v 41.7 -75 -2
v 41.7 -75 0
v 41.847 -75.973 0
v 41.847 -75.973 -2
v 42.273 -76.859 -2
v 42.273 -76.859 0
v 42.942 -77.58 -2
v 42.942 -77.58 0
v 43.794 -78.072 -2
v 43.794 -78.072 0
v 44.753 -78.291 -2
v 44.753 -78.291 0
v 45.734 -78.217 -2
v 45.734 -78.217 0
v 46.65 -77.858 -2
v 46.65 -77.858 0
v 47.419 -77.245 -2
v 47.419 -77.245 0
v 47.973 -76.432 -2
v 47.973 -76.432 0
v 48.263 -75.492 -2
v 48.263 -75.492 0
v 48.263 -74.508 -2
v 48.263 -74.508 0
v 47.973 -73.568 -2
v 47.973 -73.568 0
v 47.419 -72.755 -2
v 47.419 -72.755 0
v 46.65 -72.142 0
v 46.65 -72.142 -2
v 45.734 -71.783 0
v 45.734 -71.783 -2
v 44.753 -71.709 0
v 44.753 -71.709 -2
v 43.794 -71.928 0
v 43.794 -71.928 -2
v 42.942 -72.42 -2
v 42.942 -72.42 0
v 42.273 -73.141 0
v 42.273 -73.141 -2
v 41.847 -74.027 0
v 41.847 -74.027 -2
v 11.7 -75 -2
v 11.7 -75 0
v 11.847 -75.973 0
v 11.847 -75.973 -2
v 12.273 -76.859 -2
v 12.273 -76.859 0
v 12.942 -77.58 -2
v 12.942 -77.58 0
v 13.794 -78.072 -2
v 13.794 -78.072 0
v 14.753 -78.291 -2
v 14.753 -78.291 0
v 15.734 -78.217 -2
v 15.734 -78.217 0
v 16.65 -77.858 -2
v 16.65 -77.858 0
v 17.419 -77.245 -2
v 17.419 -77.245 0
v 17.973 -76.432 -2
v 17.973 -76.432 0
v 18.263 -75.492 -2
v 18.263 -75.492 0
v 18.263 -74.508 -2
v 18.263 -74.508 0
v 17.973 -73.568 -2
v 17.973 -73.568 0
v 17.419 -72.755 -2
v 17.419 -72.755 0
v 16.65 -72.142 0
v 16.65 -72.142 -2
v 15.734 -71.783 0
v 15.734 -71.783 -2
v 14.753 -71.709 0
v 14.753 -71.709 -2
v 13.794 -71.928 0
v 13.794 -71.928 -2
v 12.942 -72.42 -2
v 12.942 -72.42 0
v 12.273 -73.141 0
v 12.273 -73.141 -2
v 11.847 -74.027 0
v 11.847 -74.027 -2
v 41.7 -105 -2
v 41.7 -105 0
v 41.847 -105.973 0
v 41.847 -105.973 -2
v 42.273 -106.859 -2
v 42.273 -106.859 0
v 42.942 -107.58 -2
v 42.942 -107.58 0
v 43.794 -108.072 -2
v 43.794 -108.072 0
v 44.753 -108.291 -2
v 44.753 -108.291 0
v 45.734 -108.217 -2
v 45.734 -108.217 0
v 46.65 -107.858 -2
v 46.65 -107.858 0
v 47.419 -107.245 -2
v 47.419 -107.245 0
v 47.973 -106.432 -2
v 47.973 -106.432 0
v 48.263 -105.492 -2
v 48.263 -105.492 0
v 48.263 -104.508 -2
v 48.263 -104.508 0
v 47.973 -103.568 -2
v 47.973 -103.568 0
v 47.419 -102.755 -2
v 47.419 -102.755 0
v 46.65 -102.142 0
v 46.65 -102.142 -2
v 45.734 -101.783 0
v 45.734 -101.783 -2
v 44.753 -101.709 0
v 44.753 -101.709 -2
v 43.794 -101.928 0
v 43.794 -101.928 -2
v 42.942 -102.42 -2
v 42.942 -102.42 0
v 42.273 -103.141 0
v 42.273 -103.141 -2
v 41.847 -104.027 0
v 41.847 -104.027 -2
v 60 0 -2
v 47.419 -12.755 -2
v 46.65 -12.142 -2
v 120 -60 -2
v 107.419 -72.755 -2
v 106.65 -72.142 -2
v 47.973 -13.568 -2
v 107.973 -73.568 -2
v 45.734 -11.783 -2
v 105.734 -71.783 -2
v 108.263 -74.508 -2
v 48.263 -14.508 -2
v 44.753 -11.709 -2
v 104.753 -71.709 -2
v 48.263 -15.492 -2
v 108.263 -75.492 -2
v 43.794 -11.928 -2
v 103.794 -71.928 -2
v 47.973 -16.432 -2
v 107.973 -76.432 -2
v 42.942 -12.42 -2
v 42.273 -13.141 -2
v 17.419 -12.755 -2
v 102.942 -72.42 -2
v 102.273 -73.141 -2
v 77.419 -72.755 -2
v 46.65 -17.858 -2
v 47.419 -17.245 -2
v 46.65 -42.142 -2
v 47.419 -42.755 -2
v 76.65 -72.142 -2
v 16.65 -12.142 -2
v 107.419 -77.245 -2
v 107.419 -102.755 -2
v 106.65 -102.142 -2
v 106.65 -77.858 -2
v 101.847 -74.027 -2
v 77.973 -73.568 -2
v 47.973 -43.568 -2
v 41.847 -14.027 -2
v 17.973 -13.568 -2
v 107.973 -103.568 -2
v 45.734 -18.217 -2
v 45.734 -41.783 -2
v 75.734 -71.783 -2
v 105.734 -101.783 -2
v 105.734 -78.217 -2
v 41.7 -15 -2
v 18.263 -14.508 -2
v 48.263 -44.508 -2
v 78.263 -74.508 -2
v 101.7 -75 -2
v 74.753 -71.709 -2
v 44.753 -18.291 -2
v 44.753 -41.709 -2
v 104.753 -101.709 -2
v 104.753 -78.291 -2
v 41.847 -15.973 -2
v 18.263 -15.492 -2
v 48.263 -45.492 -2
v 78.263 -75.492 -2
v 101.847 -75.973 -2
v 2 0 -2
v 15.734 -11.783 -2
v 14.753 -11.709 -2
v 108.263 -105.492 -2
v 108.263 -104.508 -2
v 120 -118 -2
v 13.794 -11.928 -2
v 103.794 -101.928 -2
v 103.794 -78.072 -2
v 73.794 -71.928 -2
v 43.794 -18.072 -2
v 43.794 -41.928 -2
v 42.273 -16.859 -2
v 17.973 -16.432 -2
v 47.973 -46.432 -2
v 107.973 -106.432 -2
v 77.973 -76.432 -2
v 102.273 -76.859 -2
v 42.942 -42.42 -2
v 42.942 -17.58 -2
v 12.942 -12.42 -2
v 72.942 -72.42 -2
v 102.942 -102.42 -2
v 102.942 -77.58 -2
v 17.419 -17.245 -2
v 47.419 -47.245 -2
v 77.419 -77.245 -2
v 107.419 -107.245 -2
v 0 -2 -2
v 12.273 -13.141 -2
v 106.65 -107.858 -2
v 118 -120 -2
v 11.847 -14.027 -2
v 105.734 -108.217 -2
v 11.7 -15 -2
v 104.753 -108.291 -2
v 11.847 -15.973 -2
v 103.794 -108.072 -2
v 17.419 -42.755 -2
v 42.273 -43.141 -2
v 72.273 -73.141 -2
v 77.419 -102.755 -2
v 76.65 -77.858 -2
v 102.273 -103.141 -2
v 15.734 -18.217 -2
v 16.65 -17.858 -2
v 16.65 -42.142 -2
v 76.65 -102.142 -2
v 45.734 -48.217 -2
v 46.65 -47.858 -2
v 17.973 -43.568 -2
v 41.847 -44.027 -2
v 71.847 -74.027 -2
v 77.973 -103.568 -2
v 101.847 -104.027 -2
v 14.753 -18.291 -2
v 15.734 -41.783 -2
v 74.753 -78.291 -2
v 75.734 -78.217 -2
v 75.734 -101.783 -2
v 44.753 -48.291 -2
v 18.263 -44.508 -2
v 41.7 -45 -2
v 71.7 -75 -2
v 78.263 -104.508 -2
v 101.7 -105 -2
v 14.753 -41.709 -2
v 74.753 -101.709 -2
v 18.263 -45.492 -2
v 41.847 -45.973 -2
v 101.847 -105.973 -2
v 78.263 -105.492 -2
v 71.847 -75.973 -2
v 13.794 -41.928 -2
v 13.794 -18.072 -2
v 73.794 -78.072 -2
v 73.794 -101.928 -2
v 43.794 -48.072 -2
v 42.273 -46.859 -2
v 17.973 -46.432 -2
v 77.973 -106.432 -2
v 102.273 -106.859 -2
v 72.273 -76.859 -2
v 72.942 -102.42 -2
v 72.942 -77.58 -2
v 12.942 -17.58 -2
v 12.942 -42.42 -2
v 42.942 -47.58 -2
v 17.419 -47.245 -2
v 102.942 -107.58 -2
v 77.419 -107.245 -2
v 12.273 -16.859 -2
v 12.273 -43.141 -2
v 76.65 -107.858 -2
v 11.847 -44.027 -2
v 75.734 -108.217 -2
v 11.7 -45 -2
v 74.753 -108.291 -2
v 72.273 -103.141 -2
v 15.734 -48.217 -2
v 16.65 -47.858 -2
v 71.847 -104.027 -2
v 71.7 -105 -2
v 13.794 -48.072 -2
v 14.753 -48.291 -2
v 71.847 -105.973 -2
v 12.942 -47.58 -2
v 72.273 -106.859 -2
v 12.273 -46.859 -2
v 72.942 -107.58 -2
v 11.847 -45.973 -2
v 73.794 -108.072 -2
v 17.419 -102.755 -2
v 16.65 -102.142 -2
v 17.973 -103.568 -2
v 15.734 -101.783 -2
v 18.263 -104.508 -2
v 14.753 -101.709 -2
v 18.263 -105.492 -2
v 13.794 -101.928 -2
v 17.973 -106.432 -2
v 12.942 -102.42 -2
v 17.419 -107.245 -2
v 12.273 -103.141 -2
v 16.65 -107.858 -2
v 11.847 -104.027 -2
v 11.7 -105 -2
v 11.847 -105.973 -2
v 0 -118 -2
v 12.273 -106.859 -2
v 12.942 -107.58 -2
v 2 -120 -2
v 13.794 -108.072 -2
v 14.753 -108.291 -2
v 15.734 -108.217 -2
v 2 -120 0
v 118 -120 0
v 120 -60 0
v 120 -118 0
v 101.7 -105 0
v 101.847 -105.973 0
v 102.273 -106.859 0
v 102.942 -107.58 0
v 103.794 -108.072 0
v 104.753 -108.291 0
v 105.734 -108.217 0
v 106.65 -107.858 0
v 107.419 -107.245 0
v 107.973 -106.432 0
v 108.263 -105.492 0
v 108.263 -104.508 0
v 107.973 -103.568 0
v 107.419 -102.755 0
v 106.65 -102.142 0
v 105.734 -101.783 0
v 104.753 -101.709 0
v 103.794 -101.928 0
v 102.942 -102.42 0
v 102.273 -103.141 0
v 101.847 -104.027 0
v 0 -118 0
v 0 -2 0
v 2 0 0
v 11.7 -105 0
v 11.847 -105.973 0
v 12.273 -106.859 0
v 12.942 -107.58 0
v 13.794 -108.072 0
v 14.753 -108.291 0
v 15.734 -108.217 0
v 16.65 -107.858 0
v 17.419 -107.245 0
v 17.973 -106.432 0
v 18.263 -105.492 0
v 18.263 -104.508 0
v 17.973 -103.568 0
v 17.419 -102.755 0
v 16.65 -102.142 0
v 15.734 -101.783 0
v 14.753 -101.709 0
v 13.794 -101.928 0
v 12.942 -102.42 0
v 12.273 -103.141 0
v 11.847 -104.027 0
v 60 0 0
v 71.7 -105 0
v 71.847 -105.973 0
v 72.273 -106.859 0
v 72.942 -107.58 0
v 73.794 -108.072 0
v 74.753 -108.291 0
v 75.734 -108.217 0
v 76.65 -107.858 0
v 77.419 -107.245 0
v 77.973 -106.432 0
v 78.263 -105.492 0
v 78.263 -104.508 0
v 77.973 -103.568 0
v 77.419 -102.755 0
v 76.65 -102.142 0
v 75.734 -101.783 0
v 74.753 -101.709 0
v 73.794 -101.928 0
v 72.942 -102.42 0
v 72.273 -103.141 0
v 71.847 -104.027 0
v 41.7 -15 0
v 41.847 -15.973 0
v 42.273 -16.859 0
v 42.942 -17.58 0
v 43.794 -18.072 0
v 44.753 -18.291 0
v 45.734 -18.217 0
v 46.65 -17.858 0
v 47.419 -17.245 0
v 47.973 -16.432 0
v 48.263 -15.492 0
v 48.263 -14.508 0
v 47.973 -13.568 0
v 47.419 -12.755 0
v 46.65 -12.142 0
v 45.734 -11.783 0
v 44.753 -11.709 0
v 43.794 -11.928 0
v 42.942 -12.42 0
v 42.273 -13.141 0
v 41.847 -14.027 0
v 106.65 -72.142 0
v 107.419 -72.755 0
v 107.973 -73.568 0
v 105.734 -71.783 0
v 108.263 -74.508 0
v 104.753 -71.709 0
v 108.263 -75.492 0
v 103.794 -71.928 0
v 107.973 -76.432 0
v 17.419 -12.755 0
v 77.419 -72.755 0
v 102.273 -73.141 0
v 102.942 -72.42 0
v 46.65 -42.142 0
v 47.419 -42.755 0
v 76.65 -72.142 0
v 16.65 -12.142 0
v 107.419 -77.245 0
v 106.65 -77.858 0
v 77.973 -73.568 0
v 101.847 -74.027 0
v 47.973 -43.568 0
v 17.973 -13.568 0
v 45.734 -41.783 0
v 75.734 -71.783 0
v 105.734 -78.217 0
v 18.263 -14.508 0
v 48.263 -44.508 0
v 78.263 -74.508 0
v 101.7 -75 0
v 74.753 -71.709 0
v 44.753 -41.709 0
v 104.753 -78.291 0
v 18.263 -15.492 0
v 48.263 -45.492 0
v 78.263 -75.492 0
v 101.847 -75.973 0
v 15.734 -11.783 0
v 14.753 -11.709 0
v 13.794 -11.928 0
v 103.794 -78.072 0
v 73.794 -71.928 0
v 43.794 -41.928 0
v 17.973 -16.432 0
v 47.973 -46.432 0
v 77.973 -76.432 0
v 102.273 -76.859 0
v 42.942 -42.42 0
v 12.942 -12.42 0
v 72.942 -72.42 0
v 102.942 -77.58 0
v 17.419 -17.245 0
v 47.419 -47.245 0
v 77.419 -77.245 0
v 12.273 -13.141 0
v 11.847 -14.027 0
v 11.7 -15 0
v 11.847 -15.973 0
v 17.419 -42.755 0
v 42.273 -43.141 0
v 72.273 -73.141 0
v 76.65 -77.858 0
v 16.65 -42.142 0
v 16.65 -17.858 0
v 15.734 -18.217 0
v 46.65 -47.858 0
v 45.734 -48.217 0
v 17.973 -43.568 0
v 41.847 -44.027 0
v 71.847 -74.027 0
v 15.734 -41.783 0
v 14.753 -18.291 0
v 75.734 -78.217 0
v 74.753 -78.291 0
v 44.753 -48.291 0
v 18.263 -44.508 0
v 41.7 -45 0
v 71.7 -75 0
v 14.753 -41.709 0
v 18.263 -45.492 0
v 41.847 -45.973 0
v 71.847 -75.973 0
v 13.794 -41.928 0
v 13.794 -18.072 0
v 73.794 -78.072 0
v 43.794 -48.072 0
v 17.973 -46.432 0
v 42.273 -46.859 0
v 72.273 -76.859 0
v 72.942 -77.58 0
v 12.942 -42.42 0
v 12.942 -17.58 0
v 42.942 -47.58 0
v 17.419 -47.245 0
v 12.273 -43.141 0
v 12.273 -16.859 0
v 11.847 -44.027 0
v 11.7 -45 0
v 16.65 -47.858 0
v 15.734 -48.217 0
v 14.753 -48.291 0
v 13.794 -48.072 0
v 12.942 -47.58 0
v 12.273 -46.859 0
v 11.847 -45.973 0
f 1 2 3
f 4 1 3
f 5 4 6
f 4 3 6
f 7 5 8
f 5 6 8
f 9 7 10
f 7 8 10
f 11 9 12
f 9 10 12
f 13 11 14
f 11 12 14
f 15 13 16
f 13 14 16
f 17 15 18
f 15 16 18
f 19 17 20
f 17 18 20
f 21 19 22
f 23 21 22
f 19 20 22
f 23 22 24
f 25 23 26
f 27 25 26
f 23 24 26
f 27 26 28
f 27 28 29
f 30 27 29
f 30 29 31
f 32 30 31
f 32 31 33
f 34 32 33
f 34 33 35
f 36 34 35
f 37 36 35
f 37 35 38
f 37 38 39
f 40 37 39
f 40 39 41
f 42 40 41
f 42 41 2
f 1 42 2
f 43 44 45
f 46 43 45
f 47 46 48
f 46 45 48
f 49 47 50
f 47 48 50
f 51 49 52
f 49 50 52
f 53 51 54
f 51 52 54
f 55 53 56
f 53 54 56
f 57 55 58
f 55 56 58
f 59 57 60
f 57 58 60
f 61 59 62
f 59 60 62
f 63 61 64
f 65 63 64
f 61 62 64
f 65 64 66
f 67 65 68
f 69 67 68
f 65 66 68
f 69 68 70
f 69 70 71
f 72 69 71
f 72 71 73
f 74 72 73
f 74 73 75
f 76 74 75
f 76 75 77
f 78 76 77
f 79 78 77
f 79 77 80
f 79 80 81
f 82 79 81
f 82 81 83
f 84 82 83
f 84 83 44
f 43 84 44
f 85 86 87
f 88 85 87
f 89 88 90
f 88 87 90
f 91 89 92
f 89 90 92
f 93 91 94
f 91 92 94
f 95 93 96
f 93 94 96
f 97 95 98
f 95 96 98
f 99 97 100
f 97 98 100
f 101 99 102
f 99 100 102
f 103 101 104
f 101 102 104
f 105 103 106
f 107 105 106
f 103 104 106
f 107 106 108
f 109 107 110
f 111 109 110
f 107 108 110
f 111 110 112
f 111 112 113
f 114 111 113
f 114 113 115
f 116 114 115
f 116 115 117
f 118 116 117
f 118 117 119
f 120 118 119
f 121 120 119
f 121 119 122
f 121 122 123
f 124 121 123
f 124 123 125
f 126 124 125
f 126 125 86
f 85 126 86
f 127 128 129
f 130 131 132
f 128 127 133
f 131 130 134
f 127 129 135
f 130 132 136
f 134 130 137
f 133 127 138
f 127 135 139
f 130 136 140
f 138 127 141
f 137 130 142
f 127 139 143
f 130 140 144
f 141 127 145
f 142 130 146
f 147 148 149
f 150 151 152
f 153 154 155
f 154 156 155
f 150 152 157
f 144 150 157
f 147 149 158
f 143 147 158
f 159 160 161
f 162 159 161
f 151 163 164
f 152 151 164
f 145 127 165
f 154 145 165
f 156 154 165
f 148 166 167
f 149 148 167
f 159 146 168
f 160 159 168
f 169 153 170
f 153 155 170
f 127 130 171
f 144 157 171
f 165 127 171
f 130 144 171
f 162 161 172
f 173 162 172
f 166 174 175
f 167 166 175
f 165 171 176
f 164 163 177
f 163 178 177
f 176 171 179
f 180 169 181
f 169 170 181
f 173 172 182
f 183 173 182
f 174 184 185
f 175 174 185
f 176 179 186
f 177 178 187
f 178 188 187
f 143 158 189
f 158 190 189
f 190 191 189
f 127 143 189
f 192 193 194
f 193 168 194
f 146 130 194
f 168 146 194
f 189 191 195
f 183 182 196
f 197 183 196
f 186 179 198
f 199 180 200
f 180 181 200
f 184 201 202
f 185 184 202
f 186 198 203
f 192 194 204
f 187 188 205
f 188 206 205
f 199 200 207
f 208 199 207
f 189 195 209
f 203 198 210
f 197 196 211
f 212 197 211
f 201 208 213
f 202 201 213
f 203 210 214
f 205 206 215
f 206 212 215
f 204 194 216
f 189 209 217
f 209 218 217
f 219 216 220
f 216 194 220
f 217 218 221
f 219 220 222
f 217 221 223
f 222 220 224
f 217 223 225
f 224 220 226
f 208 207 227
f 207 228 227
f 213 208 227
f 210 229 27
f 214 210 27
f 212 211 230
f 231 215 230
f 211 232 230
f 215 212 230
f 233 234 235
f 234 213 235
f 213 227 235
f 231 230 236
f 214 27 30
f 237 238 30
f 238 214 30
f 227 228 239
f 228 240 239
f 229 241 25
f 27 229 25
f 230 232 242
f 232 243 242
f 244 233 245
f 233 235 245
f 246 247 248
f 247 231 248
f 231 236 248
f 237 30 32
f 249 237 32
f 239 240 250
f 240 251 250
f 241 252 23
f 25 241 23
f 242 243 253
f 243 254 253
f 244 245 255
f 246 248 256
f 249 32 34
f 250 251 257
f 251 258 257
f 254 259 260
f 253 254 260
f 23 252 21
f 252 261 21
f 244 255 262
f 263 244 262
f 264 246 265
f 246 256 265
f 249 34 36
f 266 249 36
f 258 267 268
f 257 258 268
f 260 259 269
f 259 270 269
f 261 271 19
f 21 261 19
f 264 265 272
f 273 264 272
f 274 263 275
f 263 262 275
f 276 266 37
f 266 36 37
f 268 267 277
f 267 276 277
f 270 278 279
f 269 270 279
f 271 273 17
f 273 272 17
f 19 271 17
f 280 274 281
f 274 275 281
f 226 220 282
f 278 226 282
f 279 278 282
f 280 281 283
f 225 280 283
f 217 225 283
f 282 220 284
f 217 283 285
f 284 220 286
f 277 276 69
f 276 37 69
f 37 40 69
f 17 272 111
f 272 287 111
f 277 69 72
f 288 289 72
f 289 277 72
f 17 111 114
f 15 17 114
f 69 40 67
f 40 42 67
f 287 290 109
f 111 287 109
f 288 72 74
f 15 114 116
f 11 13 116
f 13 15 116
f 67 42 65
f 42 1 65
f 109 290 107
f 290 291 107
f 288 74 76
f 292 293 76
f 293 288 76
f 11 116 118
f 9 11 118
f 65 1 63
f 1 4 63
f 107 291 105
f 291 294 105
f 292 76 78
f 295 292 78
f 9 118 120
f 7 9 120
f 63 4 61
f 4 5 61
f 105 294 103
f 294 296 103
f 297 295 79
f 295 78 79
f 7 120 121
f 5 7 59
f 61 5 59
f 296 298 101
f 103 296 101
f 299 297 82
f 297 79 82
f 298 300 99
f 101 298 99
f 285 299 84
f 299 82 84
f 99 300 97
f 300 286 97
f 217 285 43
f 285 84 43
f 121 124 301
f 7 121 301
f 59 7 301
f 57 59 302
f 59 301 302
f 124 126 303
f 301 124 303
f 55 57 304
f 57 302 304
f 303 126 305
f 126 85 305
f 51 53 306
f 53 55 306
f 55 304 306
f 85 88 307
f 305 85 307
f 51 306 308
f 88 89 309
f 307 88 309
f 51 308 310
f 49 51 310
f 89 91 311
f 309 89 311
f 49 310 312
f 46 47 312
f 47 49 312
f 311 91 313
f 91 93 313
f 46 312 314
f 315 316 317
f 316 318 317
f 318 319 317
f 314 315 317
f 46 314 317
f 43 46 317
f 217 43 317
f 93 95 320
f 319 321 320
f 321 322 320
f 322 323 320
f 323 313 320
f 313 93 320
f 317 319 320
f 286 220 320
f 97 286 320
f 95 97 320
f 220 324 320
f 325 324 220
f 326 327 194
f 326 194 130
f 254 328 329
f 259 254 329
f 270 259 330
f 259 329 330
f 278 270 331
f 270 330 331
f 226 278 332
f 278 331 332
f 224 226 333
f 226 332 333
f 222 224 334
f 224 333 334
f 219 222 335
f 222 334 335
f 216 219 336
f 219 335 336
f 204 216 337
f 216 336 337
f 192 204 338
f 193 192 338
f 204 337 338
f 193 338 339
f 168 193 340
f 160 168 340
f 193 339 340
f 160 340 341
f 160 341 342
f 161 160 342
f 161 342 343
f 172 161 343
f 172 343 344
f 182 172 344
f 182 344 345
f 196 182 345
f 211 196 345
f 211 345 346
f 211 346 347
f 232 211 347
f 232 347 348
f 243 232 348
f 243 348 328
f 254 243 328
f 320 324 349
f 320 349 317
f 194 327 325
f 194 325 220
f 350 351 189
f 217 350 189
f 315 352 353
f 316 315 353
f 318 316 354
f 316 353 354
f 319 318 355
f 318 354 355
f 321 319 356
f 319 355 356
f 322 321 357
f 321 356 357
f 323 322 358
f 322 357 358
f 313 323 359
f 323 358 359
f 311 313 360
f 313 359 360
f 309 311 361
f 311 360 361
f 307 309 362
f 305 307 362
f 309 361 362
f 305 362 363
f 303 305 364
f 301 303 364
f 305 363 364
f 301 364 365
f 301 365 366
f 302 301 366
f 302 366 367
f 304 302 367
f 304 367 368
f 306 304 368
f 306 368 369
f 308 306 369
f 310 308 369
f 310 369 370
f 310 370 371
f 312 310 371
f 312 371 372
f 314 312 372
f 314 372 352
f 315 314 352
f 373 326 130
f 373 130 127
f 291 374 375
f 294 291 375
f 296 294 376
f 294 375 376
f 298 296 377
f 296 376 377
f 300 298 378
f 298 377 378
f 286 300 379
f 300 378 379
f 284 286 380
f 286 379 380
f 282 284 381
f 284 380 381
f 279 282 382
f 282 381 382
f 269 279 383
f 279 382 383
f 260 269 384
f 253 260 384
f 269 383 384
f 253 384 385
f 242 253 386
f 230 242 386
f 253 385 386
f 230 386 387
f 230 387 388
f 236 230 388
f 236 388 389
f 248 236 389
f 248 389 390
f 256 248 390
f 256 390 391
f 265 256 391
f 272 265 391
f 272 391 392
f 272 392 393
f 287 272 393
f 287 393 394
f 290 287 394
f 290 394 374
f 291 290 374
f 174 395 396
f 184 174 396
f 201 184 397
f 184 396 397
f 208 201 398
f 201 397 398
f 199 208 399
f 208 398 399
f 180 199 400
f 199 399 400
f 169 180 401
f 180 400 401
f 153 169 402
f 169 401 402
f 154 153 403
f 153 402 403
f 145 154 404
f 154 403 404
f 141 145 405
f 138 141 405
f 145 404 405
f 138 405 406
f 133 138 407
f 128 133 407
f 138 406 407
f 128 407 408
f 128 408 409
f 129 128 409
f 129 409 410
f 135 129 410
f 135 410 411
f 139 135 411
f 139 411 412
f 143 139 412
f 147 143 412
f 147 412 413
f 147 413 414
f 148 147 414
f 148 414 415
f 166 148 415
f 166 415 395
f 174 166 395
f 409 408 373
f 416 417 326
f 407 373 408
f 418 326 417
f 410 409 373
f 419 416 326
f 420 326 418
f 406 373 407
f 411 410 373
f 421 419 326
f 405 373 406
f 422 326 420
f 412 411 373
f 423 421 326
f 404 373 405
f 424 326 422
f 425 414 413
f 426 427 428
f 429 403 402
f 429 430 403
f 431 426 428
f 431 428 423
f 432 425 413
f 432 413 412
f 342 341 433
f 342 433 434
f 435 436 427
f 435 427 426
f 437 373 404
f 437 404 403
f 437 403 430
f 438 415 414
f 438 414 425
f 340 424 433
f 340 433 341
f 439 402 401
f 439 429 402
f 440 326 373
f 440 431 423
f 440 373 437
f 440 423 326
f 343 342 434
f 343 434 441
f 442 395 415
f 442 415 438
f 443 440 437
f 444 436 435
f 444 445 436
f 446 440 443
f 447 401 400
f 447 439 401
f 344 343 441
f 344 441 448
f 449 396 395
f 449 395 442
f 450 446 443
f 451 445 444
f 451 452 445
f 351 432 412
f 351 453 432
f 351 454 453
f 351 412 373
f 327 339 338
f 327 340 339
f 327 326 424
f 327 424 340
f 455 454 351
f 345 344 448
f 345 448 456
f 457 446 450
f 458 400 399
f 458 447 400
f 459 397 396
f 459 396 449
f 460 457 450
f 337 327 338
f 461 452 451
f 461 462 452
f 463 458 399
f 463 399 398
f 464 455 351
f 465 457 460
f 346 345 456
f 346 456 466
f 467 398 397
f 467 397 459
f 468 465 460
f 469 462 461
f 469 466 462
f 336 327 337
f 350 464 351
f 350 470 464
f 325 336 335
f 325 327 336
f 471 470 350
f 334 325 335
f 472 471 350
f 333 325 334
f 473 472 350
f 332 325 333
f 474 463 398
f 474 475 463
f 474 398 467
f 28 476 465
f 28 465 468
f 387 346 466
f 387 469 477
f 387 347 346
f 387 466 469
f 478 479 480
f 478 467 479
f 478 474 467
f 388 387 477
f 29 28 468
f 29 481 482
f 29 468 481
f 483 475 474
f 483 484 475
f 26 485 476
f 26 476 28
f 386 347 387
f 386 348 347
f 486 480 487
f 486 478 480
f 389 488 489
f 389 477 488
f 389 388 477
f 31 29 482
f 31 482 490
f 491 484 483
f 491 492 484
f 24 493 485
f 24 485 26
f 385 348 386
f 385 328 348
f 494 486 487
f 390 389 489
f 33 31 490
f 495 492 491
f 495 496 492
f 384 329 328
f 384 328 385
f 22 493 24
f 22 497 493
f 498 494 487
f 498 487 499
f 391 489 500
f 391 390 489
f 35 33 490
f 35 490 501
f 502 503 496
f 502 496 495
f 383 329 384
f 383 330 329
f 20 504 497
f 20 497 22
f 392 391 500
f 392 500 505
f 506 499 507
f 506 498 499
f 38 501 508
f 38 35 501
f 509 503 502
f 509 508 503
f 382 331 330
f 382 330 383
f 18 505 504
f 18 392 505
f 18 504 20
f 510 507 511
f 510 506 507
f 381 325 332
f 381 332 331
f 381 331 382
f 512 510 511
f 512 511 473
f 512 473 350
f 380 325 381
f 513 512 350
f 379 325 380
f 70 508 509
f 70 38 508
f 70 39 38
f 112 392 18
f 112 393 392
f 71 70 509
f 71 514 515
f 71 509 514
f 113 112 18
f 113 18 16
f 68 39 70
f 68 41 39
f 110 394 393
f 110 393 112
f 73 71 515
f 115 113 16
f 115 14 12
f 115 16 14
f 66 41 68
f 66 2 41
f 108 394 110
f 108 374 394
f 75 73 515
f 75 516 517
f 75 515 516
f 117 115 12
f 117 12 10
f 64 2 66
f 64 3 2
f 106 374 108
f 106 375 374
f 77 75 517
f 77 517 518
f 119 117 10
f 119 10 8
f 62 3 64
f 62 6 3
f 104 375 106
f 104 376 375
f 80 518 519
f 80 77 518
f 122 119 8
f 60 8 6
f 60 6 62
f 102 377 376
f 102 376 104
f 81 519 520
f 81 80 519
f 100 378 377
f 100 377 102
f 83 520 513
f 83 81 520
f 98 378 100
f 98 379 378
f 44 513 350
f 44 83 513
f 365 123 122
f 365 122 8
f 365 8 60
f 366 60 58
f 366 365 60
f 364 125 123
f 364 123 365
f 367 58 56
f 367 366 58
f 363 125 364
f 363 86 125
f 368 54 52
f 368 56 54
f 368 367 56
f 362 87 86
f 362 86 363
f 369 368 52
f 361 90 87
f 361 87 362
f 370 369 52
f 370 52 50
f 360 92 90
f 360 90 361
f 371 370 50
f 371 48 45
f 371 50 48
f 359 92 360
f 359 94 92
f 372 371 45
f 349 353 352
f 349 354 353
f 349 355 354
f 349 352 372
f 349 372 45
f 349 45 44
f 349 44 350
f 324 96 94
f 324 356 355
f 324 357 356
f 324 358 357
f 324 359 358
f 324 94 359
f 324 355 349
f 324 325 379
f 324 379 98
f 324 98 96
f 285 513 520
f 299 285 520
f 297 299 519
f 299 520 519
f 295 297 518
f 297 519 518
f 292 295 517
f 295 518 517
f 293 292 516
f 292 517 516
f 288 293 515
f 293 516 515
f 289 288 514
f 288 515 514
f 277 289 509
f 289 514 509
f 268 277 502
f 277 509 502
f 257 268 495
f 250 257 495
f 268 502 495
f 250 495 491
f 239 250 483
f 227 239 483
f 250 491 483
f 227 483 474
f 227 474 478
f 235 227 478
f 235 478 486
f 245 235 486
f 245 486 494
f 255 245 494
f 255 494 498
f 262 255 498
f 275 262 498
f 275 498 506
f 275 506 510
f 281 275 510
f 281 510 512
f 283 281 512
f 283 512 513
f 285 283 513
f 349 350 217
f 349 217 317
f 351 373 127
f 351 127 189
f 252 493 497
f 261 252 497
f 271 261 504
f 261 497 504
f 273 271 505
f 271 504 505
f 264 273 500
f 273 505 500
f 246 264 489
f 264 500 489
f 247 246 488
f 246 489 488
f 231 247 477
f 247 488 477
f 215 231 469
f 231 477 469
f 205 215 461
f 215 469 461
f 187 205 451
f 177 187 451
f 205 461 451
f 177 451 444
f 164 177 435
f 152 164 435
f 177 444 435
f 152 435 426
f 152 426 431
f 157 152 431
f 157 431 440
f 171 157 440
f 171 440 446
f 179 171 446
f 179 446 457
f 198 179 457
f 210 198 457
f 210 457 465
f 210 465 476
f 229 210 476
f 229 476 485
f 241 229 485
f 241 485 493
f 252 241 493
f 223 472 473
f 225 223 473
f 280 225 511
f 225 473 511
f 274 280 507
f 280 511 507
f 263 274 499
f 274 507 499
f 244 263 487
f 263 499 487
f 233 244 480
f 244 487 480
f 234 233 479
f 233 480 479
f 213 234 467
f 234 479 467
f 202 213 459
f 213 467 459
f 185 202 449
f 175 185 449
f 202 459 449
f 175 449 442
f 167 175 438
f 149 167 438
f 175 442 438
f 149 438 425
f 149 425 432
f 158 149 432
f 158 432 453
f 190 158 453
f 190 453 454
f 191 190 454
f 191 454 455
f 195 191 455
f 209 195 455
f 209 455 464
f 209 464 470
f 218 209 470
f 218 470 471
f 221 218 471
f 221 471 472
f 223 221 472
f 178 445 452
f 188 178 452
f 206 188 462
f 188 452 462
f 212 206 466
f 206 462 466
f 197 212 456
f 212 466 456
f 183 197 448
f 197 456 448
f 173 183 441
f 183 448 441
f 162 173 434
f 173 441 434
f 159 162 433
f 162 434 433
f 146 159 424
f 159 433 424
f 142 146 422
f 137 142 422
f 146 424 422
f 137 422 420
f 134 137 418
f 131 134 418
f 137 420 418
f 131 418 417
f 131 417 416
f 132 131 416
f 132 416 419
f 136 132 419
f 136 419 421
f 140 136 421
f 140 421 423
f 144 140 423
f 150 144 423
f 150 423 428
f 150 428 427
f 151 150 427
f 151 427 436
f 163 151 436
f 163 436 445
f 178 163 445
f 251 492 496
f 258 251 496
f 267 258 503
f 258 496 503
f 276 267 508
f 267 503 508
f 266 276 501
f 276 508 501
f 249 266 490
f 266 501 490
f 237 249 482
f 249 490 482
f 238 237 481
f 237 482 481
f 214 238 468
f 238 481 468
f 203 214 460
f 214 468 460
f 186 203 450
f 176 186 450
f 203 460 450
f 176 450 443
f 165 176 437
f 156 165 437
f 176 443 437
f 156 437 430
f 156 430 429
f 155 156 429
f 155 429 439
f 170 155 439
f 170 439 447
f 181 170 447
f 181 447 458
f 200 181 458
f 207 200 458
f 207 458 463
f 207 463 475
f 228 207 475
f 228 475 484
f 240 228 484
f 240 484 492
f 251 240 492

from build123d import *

# Parameters (mm, degrees)
EXTRUDE_1_DEPTH   = 2
HOLE_WIZARD_M61_D = 6.6
CHAMFER_1_SIZE    = 2


with BuildPart() as part:
    # Эскиз1 → Бобышка-Вытянуть1 (new body)
    with BuildSketch(Plane(origin=(0, 0, 0), x_dir=(1, 0, 0), z_dir=(0, 0, -1))):
        Polygon((0, 0), (0, 120), (120, 120), (120, 60), (60, 0), align=None)
    extrude(amount=EXTRUDE_1_DEPTH)

    # Отверстие с зазором M61 (through all)
    with Locations(Plane(origin=(0, 0, -2), x_dir=(1, 0, 0), z_dir=(0, 0, -1))):
        with Locations((15, 105), (15, 75), (15, 45), (15, 15), (45, 105), (45, 75), (45, 45), (45, 15), (75, 105), (75, 75), (105, 105), (105, 75)):
            Hole(HOLE_WIZARD_M61_D / 2)

    # Фаска1
    chamfer_1_edges = [part.edges().sort_by_distance(p)[0] for p in [
        (0, 0, -1),
        (0, -120, -1),
        (120, -120, -1),
    ]]
    chamfer(chamfer_1_edges, length=CHAMFER_1_SIZE)


solid = part.part
